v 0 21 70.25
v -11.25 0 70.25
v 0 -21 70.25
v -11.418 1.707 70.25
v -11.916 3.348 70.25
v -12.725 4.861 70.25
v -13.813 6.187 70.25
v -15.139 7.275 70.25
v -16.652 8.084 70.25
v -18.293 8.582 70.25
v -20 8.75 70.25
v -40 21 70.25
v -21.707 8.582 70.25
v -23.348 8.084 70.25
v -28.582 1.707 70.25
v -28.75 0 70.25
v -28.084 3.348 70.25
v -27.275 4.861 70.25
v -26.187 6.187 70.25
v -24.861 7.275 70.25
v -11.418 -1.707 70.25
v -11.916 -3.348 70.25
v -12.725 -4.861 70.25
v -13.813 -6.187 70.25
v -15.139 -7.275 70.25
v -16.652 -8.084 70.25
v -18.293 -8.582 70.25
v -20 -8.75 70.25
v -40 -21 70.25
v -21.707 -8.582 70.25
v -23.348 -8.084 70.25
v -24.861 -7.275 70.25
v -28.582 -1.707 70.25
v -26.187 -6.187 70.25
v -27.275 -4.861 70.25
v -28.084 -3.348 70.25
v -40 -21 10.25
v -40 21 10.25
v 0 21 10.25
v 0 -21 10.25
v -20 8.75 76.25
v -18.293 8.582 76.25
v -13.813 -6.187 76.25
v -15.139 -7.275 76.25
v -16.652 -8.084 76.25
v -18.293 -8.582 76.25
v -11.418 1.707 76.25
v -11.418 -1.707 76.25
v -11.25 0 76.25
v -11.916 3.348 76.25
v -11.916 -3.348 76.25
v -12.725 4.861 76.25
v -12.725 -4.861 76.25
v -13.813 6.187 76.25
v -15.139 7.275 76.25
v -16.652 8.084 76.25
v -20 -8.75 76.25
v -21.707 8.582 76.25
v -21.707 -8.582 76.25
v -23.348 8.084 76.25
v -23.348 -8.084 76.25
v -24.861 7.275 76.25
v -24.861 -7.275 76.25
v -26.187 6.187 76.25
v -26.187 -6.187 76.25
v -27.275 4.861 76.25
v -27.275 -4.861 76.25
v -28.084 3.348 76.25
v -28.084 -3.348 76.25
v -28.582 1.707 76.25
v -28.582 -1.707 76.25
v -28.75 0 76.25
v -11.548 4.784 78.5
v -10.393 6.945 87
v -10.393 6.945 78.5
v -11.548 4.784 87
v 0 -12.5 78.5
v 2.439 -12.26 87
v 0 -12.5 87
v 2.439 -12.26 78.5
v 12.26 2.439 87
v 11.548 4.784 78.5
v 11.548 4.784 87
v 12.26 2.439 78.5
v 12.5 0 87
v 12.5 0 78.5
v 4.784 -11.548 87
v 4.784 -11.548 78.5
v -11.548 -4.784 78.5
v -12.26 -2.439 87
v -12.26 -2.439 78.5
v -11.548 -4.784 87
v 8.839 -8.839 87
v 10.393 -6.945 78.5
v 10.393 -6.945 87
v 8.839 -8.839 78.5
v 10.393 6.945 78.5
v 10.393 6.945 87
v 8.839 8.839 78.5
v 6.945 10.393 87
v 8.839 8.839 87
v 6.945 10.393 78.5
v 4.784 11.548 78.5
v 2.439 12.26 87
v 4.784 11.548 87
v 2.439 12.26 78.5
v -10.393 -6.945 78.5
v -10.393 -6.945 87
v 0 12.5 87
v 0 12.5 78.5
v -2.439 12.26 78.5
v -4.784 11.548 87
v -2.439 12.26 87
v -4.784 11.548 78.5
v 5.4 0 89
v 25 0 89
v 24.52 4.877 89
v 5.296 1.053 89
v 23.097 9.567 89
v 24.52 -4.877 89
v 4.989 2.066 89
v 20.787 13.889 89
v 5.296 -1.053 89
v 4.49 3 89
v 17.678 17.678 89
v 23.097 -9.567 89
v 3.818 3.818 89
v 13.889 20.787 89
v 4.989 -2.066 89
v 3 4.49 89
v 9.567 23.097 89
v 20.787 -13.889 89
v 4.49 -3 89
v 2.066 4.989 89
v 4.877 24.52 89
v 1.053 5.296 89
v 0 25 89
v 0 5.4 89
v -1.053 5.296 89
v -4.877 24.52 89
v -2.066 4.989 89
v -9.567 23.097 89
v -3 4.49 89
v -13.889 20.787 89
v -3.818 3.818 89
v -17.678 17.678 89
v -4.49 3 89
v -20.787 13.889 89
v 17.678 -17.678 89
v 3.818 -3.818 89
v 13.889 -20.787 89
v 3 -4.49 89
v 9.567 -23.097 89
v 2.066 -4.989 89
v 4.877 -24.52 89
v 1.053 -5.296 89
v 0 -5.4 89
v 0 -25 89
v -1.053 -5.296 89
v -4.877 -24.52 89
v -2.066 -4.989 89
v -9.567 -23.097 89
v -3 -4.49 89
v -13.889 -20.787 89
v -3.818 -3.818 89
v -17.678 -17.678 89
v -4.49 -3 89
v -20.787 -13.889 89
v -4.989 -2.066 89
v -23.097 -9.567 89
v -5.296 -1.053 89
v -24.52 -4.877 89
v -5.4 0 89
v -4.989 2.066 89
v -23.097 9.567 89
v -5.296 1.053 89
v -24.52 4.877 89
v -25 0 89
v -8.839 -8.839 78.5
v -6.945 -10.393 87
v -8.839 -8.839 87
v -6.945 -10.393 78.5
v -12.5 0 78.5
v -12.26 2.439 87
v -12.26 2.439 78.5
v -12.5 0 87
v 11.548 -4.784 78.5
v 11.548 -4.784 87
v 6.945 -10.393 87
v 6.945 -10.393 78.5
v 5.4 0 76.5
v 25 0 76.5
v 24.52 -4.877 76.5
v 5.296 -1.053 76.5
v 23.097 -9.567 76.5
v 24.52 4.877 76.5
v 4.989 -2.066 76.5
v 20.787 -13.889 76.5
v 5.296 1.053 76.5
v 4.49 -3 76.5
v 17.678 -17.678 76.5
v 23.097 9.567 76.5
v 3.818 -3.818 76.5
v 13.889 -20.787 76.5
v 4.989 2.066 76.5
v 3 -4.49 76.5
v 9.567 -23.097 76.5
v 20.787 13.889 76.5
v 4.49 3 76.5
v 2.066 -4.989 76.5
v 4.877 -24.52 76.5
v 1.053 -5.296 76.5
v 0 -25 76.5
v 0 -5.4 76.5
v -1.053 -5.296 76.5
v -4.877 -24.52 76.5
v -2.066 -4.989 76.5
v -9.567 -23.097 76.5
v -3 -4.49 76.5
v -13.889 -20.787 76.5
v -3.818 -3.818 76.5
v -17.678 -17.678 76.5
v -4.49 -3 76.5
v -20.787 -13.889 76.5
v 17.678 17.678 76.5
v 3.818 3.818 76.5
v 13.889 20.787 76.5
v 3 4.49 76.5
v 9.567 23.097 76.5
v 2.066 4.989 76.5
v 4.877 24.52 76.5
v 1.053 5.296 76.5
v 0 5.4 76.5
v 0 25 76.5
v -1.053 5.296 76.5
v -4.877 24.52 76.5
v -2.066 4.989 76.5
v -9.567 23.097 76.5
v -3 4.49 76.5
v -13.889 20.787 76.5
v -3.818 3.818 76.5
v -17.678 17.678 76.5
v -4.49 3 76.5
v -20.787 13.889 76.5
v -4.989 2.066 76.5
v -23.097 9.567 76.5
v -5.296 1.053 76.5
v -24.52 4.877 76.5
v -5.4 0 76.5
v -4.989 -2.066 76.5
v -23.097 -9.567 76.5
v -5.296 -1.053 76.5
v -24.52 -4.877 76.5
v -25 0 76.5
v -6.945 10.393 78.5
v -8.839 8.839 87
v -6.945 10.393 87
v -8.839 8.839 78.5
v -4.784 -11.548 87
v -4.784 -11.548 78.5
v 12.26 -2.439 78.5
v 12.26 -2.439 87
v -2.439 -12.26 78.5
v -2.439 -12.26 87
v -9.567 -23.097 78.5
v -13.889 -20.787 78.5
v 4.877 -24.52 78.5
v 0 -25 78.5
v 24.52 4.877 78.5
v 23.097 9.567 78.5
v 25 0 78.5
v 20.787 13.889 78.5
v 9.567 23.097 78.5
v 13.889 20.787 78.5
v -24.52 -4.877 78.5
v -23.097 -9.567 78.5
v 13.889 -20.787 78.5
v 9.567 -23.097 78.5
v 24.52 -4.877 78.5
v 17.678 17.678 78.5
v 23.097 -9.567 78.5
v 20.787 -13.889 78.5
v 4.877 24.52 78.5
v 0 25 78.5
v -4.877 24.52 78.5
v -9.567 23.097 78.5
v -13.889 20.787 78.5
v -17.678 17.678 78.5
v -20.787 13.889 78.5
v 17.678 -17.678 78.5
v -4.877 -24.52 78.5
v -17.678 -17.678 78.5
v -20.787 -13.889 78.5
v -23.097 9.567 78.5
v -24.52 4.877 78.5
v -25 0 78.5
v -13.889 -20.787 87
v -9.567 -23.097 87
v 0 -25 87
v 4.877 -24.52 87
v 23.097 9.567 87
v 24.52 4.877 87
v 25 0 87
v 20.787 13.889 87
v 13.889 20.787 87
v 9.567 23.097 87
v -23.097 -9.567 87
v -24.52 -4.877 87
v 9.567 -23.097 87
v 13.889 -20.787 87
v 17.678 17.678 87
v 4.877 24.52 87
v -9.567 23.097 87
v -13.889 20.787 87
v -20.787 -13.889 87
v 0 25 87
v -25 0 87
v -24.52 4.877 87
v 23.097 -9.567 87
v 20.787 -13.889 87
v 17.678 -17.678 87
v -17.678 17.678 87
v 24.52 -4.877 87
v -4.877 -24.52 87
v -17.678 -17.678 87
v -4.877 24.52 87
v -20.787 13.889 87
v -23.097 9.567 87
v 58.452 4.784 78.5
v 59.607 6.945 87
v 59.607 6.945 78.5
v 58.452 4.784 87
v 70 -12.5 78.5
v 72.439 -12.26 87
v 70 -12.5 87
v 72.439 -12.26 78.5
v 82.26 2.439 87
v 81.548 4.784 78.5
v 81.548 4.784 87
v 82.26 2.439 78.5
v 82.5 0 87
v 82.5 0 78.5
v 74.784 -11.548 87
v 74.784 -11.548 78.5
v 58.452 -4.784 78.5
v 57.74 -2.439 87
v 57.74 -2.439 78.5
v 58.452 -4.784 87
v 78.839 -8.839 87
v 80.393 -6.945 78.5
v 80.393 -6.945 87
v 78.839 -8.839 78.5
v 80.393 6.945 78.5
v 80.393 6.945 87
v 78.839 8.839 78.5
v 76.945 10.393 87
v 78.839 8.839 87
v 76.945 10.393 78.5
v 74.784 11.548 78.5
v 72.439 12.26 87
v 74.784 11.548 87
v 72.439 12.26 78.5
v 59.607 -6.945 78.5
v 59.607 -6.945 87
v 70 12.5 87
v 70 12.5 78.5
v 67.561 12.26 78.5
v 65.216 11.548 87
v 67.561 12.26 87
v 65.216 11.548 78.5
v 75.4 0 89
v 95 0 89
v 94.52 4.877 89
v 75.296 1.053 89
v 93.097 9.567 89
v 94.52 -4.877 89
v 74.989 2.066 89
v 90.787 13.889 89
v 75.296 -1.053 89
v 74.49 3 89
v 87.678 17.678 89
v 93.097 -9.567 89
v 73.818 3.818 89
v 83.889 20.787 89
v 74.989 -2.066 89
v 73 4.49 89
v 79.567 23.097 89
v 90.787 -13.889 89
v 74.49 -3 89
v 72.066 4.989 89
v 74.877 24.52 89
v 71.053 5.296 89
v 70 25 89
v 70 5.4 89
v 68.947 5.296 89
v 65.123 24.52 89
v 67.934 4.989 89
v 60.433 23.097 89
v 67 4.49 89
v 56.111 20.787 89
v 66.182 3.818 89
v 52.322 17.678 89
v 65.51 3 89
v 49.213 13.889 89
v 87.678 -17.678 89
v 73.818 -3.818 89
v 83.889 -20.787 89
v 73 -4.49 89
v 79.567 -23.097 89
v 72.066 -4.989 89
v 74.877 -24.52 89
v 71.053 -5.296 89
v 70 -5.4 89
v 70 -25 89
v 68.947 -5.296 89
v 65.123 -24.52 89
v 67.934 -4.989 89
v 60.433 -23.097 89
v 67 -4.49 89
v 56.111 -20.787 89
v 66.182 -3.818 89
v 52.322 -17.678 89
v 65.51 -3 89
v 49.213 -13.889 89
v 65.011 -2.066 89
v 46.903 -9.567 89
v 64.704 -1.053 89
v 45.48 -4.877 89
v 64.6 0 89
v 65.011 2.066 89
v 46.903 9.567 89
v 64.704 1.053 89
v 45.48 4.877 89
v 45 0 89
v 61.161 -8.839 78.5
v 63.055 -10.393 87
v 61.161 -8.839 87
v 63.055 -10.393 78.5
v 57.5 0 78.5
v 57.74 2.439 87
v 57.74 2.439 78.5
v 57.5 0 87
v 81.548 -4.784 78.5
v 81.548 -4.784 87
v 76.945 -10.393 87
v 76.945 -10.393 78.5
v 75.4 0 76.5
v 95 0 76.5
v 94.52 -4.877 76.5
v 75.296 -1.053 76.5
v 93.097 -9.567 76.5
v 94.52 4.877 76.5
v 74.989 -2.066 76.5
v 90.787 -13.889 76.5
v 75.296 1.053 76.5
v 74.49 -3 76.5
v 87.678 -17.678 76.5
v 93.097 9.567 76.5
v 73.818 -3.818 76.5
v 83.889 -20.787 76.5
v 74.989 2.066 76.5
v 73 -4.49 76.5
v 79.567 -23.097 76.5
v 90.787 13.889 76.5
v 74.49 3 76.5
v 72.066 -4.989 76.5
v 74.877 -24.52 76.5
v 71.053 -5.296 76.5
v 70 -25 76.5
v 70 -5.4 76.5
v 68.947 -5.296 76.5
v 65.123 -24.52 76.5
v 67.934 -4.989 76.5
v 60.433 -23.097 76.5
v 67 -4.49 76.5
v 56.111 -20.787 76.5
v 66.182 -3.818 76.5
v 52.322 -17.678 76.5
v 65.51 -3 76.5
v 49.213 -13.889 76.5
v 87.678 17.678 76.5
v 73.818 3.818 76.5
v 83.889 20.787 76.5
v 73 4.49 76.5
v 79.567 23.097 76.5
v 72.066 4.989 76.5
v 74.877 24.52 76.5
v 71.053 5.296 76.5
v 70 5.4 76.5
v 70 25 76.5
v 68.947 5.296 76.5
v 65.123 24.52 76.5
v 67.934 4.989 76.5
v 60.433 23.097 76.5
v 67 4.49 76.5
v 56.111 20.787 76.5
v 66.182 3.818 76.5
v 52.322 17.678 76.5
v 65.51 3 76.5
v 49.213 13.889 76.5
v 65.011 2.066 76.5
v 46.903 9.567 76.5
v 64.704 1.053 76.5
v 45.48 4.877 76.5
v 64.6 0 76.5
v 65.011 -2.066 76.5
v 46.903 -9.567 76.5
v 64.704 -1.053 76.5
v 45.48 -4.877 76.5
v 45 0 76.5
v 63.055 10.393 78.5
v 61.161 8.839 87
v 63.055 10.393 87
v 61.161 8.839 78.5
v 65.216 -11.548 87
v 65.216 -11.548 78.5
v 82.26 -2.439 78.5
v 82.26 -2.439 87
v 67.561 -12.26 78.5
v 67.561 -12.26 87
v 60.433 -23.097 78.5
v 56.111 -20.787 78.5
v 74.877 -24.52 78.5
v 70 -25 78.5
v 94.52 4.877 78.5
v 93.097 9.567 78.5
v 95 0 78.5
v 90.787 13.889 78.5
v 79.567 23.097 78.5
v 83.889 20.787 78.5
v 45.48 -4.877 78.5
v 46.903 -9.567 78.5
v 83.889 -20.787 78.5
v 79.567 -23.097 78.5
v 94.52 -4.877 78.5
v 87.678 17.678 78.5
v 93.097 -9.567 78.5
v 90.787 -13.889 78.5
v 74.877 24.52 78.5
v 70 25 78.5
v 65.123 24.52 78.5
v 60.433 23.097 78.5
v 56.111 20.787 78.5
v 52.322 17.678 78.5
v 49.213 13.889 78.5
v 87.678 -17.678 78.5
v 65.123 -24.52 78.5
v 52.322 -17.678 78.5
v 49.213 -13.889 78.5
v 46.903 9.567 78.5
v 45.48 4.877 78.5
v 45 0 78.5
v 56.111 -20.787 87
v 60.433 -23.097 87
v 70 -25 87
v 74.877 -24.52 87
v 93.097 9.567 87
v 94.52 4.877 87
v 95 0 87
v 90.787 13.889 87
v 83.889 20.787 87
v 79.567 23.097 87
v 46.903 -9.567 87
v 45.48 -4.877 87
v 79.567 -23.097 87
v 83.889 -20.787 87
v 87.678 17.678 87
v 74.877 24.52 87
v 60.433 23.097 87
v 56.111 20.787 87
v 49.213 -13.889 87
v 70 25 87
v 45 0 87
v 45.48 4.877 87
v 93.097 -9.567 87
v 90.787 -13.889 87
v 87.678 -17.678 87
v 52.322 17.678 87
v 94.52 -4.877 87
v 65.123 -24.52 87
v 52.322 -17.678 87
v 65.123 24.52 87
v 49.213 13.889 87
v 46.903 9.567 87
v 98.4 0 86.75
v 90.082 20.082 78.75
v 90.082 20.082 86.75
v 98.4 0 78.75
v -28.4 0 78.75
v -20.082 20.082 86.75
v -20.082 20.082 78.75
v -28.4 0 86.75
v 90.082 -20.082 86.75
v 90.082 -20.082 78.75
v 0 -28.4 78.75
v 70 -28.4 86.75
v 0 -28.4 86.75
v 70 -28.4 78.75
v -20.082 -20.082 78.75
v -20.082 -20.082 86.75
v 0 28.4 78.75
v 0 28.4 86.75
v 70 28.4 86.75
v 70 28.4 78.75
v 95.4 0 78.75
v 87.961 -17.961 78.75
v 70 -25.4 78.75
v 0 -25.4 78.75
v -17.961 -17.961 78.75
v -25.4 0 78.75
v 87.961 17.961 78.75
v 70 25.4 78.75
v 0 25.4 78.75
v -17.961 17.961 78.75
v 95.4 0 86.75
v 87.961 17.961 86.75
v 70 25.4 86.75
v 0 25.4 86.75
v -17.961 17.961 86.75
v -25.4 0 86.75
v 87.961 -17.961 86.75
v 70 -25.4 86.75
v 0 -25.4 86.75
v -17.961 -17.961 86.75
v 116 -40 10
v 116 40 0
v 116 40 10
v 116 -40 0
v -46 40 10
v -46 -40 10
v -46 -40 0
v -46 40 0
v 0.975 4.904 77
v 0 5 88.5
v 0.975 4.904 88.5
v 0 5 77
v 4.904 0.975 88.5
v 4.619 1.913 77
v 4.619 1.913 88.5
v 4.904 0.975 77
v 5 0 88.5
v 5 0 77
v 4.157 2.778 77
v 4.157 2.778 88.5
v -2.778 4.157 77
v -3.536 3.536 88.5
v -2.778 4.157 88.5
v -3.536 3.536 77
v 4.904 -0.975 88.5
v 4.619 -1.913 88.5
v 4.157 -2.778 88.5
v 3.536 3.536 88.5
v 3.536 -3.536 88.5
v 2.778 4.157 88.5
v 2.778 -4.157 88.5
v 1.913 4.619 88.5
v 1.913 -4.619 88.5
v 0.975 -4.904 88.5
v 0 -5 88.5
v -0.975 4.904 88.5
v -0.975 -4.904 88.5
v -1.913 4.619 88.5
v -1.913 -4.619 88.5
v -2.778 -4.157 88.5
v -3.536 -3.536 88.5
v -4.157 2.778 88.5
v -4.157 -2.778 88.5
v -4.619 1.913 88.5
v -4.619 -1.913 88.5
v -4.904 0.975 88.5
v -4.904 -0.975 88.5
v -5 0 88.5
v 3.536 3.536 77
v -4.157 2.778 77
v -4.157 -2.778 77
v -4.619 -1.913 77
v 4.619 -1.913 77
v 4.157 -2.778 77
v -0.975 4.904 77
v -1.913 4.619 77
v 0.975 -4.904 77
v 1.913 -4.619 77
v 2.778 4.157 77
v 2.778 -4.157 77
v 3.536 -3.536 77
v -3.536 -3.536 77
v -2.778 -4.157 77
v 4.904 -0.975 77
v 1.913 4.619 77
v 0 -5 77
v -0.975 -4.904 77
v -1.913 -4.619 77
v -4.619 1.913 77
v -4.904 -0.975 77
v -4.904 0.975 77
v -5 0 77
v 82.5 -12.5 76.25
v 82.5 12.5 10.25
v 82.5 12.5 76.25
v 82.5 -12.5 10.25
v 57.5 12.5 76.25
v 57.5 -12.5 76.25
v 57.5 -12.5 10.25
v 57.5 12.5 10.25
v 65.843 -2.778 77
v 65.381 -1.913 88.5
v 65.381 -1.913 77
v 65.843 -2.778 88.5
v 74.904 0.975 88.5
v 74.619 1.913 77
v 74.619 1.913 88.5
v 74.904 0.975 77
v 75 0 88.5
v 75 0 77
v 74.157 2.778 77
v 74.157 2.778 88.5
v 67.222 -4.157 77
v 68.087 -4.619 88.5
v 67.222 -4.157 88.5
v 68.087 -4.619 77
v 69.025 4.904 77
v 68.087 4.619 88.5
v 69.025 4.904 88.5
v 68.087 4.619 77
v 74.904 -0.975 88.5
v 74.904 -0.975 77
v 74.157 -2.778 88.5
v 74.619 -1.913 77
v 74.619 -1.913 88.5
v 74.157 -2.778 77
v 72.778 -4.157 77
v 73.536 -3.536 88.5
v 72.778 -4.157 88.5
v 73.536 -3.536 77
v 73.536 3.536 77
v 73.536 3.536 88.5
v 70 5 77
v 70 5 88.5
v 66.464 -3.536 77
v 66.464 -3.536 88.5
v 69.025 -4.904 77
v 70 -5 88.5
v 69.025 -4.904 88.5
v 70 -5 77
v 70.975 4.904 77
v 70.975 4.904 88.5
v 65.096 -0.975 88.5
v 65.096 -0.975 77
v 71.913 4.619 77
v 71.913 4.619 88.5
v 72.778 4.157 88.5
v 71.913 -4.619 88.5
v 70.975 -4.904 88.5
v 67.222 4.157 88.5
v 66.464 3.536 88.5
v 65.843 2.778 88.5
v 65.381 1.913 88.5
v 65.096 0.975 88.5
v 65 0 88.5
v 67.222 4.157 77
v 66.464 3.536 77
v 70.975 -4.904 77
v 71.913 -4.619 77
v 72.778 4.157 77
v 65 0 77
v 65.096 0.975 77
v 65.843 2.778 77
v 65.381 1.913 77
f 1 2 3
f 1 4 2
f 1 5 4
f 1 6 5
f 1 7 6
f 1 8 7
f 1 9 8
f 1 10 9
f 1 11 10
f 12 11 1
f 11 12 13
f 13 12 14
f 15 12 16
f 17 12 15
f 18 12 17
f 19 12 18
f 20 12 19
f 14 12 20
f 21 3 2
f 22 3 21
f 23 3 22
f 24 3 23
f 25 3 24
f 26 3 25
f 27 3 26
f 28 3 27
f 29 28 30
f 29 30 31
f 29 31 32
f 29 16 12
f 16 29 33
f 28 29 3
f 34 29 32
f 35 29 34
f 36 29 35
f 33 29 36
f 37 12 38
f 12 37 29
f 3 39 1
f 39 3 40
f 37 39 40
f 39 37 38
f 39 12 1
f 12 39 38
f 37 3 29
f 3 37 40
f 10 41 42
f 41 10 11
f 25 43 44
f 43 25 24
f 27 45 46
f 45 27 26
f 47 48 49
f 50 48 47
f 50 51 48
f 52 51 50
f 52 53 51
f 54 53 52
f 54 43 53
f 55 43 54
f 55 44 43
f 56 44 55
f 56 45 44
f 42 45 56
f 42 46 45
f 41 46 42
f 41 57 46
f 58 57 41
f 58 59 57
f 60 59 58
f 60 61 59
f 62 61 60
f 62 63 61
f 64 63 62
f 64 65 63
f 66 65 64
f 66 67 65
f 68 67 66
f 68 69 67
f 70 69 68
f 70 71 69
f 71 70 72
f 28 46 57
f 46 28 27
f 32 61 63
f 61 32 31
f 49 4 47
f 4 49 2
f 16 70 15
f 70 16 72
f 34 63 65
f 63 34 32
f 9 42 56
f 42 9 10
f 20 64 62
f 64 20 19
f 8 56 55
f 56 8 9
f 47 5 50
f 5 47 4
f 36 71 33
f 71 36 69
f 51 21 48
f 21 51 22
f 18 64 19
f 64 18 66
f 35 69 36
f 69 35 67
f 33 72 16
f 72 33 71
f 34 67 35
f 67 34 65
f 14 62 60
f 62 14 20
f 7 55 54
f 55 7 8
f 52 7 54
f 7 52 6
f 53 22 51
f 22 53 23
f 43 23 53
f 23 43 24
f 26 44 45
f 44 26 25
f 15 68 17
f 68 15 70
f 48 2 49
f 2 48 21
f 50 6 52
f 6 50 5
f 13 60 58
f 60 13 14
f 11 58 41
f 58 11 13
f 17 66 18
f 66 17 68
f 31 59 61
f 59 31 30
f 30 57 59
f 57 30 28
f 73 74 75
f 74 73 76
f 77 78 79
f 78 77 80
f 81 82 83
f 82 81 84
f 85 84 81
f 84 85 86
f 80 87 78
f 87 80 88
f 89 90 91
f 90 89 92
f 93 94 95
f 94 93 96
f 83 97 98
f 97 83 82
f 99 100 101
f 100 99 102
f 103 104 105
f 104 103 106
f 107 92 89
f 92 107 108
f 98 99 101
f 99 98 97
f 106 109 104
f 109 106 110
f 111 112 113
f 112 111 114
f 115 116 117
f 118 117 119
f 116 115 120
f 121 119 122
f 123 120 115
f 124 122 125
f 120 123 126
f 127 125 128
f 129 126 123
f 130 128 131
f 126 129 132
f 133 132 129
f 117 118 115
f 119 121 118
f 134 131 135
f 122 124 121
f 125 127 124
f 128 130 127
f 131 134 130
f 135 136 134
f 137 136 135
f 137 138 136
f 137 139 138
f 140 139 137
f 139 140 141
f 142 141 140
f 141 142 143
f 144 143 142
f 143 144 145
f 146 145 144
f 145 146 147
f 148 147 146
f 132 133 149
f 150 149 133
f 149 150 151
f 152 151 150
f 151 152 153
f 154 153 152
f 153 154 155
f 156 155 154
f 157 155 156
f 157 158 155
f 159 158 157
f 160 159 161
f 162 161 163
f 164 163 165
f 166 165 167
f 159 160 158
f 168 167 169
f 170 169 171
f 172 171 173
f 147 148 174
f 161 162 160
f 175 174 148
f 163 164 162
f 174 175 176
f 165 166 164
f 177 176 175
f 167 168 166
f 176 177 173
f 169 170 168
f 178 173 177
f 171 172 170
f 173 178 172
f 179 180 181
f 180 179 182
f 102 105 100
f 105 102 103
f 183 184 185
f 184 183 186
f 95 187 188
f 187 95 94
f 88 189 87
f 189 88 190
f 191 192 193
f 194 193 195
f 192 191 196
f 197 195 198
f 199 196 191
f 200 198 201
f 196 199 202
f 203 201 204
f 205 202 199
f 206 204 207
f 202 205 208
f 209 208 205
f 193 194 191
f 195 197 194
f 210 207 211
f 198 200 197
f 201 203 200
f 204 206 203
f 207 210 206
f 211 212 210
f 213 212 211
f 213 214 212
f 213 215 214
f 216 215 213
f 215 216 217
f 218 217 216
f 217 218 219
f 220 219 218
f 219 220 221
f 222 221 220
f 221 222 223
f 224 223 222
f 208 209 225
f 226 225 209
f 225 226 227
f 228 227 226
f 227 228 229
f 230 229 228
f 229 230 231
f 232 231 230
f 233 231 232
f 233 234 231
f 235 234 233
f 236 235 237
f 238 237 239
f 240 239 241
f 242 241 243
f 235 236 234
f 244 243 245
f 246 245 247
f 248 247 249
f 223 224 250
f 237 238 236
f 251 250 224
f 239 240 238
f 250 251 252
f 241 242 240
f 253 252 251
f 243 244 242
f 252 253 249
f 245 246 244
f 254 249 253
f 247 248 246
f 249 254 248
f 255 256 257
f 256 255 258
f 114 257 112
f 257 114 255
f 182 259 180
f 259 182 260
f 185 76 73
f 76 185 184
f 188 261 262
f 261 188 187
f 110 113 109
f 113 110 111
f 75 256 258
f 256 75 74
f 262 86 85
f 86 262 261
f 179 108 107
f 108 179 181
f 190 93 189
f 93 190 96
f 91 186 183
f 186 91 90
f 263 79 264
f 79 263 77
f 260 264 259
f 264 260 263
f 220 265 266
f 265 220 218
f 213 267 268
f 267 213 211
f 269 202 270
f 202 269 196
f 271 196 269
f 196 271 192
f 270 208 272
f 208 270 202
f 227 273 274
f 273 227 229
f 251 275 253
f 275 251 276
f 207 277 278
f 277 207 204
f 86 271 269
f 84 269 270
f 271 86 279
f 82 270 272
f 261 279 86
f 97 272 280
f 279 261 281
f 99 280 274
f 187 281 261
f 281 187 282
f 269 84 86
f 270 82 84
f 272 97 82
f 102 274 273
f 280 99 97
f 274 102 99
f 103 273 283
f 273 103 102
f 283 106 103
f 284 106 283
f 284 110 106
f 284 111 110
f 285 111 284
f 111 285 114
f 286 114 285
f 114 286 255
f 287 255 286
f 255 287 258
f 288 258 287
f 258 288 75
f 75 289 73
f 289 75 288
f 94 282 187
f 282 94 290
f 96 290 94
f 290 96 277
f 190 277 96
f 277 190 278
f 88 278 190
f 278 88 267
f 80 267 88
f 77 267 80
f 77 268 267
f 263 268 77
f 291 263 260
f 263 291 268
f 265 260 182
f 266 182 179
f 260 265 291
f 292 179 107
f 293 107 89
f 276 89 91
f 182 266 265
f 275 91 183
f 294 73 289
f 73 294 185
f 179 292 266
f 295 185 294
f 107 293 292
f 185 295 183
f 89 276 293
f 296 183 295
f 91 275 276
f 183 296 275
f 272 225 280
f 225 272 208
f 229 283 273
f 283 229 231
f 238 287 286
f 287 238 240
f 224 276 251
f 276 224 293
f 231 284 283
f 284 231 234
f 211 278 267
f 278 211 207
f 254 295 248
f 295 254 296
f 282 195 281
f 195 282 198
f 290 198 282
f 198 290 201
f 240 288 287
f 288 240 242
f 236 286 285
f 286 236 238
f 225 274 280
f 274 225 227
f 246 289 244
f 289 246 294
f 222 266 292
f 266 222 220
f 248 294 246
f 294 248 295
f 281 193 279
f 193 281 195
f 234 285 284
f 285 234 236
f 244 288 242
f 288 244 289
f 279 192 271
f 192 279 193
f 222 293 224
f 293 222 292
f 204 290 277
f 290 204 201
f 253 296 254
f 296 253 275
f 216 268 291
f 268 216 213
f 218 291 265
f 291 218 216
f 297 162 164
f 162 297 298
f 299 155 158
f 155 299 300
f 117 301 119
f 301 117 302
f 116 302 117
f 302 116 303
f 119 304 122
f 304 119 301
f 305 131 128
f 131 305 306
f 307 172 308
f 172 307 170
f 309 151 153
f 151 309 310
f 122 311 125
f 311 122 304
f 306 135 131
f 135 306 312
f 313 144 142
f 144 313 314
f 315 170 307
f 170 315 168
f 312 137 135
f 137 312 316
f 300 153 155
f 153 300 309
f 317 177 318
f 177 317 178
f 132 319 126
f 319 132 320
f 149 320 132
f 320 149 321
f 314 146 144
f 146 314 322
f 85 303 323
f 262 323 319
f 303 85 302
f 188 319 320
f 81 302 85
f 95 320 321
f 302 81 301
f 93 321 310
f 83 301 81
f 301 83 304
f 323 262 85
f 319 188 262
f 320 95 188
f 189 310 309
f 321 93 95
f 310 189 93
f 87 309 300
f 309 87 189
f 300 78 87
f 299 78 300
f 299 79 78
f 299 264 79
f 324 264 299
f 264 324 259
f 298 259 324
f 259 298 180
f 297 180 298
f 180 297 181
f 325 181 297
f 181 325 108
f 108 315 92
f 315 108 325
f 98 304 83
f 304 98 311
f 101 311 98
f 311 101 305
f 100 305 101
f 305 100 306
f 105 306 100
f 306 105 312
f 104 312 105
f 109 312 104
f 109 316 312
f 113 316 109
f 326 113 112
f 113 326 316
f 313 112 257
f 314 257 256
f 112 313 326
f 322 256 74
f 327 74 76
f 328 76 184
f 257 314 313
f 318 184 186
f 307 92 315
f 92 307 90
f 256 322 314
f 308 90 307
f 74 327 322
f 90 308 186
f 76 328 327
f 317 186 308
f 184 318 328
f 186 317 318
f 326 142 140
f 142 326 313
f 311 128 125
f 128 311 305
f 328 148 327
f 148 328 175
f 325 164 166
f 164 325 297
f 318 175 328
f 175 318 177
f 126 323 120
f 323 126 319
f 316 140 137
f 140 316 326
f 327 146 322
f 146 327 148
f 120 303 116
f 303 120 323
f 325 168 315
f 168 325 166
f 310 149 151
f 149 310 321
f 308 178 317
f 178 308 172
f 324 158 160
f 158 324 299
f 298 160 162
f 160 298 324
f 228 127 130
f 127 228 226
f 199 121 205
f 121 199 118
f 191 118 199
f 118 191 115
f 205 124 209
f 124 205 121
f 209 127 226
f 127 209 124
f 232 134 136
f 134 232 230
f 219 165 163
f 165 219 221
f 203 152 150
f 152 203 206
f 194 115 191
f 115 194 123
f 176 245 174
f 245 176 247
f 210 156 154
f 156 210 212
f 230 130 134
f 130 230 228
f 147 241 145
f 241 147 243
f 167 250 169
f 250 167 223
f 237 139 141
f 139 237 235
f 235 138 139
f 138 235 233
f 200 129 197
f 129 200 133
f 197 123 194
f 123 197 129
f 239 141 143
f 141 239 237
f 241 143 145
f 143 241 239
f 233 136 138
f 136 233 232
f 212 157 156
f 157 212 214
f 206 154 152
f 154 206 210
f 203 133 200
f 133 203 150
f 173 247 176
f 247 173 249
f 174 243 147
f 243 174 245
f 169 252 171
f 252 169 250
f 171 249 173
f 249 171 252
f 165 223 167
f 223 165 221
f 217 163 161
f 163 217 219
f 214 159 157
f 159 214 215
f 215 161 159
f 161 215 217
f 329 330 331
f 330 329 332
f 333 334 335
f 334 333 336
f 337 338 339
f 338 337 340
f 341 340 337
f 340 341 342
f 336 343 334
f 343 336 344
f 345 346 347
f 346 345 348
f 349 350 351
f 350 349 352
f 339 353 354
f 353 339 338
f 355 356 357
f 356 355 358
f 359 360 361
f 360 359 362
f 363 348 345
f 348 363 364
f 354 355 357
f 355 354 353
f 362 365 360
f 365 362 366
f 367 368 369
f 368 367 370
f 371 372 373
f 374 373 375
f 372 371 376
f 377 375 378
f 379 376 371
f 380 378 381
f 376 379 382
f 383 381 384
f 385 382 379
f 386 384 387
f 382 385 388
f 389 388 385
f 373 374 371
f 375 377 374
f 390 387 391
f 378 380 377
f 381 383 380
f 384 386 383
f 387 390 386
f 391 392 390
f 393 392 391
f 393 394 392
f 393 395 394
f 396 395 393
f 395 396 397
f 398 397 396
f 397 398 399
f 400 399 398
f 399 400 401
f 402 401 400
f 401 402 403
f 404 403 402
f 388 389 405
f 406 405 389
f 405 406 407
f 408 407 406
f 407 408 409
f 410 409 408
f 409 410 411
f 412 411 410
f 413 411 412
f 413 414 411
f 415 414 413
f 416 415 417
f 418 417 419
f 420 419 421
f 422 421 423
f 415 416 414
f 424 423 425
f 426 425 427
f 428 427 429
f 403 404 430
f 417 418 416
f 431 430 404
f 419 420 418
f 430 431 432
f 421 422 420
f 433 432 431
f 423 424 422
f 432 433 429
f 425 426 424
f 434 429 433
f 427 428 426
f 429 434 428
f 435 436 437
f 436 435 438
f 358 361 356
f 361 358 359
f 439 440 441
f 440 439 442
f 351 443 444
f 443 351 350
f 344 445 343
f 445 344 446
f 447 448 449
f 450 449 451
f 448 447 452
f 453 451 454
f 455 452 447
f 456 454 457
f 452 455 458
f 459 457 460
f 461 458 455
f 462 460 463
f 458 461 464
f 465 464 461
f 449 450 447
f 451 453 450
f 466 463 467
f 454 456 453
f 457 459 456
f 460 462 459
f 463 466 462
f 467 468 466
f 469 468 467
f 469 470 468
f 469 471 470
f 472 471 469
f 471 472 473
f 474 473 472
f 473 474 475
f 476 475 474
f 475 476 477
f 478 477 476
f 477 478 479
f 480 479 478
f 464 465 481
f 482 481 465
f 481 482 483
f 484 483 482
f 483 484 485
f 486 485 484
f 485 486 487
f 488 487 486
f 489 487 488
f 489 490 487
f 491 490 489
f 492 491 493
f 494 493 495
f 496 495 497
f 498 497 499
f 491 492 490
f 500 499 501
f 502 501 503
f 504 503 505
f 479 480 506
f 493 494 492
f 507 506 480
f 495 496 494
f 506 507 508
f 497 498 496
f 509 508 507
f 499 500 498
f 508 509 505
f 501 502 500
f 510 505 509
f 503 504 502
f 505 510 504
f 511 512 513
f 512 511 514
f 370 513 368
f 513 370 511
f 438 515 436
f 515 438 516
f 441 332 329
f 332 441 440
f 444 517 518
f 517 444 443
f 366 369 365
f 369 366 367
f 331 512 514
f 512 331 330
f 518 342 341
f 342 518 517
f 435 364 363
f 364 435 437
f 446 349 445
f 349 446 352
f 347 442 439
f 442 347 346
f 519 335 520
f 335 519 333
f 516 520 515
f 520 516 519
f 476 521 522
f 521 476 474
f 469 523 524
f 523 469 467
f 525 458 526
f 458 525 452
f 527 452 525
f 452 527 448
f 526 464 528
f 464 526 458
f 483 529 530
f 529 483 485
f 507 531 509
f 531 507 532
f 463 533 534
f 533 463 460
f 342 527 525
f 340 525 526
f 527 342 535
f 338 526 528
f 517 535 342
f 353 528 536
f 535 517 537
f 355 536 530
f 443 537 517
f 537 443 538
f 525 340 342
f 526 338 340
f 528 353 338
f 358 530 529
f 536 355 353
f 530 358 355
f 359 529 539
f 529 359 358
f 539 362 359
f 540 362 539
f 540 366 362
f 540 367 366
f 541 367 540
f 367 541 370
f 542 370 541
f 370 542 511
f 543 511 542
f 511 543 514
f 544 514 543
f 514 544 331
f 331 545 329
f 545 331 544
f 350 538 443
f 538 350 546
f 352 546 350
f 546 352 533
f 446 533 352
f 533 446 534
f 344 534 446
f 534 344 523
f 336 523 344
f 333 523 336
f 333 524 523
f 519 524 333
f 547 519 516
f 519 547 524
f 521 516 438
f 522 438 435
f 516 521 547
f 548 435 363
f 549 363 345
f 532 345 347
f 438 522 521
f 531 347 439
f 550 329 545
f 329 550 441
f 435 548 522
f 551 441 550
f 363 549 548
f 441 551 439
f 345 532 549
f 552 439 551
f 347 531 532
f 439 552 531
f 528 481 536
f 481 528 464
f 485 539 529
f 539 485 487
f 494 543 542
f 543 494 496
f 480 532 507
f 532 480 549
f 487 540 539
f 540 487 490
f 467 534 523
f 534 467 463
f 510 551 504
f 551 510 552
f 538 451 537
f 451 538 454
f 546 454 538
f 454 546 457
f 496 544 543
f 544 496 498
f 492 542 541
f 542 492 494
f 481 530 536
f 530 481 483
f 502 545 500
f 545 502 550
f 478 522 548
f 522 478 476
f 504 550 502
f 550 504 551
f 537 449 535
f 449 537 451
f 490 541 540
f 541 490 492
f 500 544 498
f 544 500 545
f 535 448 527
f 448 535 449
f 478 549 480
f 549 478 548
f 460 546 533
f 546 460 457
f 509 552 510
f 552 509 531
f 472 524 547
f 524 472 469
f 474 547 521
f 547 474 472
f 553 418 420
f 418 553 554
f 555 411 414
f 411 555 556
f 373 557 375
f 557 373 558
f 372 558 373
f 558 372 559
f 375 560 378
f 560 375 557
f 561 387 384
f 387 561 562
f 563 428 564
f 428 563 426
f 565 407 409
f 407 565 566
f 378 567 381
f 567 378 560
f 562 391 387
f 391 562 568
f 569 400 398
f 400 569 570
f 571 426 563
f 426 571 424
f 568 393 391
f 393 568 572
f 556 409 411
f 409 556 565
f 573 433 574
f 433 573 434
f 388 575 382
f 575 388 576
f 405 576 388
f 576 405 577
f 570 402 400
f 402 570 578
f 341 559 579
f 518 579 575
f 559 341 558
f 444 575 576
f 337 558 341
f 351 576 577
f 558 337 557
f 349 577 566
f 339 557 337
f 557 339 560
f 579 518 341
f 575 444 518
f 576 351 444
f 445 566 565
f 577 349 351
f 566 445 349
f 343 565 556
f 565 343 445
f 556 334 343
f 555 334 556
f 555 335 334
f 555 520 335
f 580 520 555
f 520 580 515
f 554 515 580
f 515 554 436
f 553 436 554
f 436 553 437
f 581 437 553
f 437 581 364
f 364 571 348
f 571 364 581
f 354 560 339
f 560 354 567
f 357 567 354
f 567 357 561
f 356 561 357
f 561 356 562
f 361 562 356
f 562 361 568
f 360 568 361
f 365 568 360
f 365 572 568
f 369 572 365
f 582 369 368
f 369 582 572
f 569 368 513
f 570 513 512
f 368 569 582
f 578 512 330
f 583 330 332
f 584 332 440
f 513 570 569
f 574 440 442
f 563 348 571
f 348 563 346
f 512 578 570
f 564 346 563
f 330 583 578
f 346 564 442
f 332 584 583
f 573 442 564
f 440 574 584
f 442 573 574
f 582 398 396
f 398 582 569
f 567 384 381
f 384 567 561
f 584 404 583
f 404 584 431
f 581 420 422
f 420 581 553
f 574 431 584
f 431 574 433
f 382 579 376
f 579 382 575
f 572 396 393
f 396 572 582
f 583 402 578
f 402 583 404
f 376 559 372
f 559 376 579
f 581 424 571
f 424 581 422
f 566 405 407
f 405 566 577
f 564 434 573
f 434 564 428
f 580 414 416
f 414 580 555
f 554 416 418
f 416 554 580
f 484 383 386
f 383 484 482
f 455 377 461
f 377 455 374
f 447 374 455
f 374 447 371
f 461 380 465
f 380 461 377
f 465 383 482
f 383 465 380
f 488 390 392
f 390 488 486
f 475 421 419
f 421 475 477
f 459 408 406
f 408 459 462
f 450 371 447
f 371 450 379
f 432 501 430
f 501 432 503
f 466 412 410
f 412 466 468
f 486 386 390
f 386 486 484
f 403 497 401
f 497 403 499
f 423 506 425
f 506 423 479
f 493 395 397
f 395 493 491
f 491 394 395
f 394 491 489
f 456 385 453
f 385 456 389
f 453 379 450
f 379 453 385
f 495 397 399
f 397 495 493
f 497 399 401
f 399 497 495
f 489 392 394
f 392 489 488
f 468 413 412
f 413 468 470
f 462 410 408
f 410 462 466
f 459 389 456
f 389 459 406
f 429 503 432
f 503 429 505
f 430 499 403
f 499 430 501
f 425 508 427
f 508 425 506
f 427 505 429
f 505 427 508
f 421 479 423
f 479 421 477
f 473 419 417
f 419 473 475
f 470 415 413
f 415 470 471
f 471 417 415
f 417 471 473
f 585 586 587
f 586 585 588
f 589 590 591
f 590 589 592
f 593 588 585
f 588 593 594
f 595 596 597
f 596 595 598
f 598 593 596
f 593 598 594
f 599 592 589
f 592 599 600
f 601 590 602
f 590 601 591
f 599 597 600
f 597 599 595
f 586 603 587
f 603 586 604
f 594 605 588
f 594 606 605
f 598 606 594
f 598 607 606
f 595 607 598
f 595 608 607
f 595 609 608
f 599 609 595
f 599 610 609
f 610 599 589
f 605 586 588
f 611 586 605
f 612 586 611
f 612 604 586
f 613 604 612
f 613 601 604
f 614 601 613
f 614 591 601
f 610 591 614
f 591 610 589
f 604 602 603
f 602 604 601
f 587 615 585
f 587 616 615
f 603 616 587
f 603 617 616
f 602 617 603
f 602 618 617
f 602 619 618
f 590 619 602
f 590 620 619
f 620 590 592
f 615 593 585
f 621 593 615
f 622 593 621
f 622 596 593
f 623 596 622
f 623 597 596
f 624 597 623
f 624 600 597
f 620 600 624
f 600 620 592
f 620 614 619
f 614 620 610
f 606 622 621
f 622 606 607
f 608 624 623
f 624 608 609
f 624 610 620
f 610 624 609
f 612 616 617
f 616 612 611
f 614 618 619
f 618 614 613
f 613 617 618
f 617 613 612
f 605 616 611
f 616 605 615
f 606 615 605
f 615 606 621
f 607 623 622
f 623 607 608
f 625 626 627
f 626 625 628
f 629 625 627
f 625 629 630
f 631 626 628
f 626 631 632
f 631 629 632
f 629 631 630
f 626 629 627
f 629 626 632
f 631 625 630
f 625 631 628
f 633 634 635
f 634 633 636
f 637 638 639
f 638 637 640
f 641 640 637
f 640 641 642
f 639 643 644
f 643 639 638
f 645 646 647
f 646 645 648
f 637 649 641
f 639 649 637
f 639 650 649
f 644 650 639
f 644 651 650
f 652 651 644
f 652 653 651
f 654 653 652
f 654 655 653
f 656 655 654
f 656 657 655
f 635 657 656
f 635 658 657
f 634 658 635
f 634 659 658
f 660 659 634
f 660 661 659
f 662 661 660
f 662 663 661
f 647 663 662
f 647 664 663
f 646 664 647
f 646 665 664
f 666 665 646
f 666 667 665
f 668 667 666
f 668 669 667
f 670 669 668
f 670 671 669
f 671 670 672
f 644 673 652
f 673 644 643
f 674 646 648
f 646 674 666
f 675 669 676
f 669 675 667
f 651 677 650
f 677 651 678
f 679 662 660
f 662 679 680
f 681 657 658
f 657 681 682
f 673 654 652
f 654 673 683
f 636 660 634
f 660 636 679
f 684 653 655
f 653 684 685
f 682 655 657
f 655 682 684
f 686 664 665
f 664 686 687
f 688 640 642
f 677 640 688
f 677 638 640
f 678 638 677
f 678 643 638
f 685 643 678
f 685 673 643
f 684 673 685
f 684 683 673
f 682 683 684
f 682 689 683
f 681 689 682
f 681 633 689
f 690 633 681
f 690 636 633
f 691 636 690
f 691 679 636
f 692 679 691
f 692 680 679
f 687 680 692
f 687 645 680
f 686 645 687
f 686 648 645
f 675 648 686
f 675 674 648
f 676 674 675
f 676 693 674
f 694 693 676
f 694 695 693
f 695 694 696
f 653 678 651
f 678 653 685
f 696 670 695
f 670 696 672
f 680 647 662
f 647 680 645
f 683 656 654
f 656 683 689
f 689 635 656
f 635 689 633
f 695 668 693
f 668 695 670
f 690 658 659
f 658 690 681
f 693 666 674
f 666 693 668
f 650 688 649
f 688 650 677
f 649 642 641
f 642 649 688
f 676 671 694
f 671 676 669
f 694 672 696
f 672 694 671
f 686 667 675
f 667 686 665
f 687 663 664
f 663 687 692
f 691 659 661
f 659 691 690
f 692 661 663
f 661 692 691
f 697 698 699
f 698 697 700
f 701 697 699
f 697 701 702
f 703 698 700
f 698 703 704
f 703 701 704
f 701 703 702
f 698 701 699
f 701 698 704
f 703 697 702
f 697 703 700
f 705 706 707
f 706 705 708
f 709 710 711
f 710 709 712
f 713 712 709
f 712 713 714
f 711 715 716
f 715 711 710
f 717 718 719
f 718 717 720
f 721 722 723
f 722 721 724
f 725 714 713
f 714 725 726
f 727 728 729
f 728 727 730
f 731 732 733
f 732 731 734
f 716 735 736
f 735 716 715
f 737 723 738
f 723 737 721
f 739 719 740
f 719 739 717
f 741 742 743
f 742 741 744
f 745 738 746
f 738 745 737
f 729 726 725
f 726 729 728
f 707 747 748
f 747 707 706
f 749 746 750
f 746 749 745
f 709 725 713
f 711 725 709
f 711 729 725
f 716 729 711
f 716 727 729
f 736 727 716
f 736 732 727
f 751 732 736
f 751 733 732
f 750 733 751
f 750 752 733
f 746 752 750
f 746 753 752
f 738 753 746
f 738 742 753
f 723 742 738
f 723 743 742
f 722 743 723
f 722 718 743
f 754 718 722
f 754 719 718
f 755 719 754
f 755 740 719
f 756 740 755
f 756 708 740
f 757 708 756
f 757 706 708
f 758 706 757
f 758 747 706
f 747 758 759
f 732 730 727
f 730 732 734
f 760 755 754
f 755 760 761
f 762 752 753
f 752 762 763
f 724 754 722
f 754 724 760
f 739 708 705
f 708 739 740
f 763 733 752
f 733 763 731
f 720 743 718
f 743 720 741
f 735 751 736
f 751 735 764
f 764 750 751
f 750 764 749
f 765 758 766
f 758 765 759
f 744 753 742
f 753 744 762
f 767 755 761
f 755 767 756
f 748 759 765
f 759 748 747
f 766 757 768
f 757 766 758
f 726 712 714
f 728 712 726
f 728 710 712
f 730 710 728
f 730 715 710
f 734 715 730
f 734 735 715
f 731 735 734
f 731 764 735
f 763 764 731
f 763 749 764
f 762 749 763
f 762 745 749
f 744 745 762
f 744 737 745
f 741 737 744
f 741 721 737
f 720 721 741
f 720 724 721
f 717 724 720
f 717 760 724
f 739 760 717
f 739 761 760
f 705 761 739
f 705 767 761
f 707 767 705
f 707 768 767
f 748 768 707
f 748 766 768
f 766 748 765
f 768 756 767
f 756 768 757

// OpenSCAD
$fn = 32;

// ------------------------------------------------------------------------
// Motor belt drive: span 70 mm, pulleys d50, belt 8 mm wide
// Every part is its own module, assembly() places every instance.
// ------------------------------------------------------------------------

// --- part 1 ---
module base_plate() {
  difference() {
    translate([-81, -40, 0]) cube([162, 80, 10]);
  }
}

// --- part 2 ---
module motor() {
  union() {
    translate([-30, -21, 0]) cube([60, 42, 40]);
    translate([33, 0, 20]) rotate([0, 90, 0]) cylinder(h = 6, d = 17.5, center = true);
  }
}

// --- part 3 ---
module drive_shaft() {
  translate([0, 0, -5.75]) cylinder(h = 11.5, d = 10);
}

// --- part 4 ---
module pulley_drive() {
  difference() {
    union() {
      cylinder(h = 12.5, d = 25);
      cylinder(h = 2, d = 50);
      translate([0, 0, 10.5]) cylinder(h = 2, d = 50);
    }
    translate([0, 0, -1]) cylinder(h = 14.5, d = 10.8);
  }
}

// --- part 5 ---
module idler_post() {
  translate([-12.5, -12.5, 0]) cube([25, 25, 66]);
}

// --- part 6 ---
module driven_shaft() {
  translate([0, 0, -5.75]) cylinder(h = 11.5, d = 10);
}

// --- part 7 ---
module pulley_driven() {
  difference() {
    union() {
      cylinder(h = 12.5, d = 25);
      cylinder(h = 2, d = 50);
      translate([0, 0, 10.5]) cylinder(h = 2, d = 50);
    }
    translate([0, 0, -1]) cylinder(h = 14.5, d = 10.8);
  }
}

// --- part 8 ---
module drive_belt() {
  difference() {
    linear_extrude(height = 8) polygon(points = concat([for (a = [90 : 45 : 270]) [28.4 * cos(a), 28.4 * sin(a)]], [for (a = [270 : 45 : 450]) [70 + 28.4 * cos(a), 28.4 * sin(a)]]));
    translate([0, 0, -1]) linear_extrude(height = 10) polygon(points = concat([for (a = [90 : 45 : 270]) [25.4 * cos(a), 25.4 * sin(a)]], [for (a = [270 : 45 : 450]) [70 + 25.4 * cos(a), 25.4 * sin(a)]]));
  }
}

// --- assembly ---
module assembly() {
  color([0.80, 0.24, 0.20]) translate([35, 0, 0]) rotate([0, 0, 0]) base_plate();
  color([0.20, 0.45, 0.75]) translate([0, 0, 40.25]) rotate([0, 270, 0]) motor();
  color([0.25, 0.62, 0.32]) translate([0, 0, 82.75]) rotate([0, 0, 0]) drive_shaft();
  color([0.92, 0.70, 0.18]) translate([0, 0, 76.5]) rotate([0, 0, 0]) pulley_drive();
  color([0.58, 0.35, 0.70]) translate([70, 0, 10.25]) rotate([0, 0, 0]) idler_post();
  color([0.16, 0.66, 0.66]) translate([70, 0, 82.75]) rotate([0, 0, 0]) driven_shaft();
  color([0.85, 0.48, 0.18]) translate([70, 0, 76.5]) rotate([0, 0, 0]) pulley_driven();
  color([0.55, 0.60, 0.65]) translate([0, 0, 78.75]) rotate([0, 0, 0]) drive_belt();
}

assembly();
